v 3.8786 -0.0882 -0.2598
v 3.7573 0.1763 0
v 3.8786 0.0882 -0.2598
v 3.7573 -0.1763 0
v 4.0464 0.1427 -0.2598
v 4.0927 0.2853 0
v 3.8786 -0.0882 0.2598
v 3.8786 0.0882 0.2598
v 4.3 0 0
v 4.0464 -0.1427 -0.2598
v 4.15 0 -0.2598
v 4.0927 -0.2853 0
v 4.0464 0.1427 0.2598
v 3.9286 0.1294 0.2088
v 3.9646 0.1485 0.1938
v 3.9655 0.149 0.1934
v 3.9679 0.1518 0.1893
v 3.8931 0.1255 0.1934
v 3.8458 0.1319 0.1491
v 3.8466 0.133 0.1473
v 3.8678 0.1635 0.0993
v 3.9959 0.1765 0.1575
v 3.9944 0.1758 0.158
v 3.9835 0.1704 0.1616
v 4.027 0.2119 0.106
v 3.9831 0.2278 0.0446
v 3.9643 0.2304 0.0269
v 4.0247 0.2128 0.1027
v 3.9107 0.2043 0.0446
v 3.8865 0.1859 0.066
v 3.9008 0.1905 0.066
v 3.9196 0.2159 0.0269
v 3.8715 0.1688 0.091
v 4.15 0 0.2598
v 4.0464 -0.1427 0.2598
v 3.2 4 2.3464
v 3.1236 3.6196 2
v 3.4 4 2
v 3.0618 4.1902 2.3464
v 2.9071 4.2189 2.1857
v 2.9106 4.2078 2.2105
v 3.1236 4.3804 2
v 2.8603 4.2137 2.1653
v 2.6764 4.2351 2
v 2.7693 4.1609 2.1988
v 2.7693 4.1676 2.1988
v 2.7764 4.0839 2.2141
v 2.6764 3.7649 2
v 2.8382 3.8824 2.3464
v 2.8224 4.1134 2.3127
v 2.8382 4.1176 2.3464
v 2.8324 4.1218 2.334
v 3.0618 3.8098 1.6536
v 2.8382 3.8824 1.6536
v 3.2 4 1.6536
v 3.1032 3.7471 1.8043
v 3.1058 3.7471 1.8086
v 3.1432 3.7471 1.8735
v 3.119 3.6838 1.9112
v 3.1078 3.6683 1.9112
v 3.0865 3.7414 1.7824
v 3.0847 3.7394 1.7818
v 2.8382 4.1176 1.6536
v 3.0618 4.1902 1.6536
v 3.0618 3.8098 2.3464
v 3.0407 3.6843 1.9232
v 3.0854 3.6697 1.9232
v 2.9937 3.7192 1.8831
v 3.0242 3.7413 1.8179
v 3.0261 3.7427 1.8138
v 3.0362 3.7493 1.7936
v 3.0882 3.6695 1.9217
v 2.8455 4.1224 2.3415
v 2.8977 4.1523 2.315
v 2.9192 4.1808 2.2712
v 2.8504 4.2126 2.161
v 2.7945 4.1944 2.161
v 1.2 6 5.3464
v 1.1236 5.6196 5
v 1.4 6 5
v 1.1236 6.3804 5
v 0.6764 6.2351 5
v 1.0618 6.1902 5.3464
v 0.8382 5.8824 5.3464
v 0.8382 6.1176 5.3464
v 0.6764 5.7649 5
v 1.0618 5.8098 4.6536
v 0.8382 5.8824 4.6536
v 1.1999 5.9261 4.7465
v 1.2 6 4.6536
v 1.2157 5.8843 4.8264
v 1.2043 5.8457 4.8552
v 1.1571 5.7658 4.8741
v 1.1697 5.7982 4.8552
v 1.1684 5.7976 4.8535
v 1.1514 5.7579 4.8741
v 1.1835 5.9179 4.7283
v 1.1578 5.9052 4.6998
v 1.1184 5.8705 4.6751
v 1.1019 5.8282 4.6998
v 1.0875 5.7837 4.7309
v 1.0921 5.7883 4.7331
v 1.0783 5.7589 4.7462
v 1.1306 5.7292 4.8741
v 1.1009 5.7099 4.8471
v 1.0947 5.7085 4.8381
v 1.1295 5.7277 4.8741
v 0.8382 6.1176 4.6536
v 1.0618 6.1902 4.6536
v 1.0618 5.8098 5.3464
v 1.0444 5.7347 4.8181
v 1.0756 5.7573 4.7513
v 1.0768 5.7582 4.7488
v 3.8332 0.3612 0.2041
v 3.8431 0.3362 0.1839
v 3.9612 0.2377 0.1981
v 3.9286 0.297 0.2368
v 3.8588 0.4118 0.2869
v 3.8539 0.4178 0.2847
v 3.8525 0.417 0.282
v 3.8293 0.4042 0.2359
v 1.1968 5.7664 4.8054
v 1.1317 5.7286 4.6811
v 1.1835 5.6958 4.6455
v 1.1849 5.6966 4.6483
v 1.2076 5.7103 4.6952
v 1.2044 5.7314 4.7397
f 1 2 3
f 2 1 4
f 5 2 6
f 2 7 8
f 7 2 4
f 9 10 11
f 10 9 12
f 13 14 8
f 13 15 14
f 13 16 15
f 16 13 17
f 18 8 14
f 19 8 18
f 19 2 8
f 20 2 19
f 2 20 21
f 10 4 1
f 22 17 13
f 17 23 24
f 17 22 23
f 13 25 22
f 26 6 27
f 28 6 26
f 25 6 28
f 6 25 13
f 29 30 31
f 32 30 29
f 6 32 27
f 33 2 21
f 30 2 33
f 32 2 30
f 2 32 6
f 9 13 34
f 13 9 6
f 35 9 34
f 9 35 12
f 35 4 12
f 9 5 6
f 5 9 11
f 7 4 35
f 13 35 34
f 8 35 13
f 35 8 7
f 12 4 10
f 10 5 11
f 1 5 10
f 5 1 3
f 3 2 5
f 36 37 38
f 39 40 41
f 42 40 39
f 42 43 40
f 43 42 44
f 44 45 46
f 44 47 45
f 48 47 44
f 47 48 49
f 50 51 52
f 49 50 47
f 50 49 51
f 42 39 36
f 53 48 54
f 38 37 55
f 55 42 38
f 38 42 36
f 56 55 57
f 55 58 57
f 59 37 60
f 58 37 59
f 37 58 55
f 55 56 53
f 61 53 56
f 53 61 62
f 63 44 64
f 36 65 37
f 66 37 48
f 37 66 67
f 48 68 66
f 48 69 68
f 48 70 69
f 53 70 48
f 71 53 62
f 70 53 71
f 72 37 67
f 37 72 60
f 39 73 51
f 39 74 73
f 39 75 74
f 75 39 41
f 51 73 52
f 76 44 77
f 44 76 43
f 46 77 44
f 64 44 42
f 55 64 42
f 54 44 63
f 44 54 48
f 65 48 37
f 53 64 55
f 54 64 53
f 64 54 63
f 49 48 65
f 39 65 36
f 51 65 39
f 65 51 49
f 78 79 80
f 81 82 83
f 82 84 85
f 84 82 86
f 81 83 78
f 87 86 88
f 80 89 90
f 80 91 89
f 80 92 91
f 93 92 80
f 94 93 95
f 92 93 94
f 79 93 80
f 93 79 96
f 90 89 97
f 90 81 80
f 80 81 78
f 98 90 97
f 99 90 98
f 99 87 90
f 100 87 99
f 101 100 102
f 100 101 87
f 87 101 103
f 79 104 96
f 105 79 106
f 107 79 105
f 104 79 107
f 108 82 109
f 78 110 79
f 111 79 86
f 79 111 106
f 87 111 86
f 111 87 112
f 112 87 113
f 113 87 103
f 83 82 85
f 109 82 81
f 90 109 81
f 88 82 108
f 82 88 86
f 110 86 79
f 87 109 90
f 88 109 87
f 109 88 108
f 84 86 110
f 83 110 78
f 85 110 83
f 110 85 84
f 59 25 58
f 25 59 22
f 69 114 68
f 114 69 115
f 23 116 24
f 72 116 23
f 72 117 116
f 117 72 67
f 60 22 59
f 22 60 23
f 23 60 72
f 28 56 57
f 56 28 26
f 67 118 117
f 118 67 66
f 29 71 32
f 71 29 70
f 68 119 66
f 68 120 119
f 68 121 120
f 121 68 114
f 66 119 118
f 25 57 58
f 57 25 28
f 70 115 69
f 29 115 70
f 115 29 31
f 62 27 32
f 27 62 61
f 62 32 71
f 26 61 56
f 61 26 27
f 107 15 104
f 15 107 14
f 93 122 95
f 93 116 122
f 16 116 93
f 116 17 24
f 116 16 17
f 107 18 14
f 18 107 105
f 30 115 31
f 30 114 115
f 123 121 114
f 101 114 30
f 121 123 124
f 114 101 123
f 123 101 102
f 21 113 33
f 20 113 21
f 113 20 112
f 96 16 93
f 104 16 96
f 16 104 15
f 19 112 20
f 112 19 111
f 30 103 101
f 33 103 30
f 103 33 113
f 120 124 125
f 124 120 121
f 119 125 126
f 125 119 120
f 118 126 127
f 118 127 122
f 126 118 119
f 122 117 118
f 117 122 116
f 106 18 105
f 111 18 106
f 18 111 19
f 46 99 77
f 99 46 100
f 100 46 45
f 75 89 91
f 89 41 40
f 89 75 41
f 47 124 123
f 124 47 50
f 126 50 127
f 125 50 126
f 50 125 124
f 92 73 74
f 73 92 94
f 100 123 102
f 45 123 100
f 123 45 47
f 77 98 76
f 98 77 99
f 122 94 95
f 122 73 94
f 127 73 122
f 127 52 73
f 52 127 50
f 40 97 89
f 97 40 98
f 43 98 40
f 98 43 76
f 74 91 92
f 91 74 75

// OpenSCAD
// ============================================
//  NORMA vs DISTANCIA
// 
// ============================================

// ===== PARÁMETROS =====
origen = [4, 0, 0];   //  para mover el origen
punto1 = [3, 4, 2];
punto2 = [1, 6, 5];

// ===== MÓDULO PARA DIBUJAR LÍNEAS (VERSIÓN HULL) =====
module linea(p1, p2, r=0.05) {
    
    // "puente" entre dos esferas usando hull()
    hull() {
        translate(p1) sphere(r);
        translate(p2) sphere(r);
    }
}


// 1. El origen ( en rojo)
color("red") 
translate(origen) 
sphere(r=0.3);

// 2. Los dos puntos (azules)
color("blue") 
translate(punto1) 
sphere(r=0.4);

color("blue") 
translate(punto2) 
sphere(r=0.4);

// 3. Línea que representa la NORMA de punto1 (del ORIGEN a punto1)
color("green", 0.7) 
linea(origen, punto1, 0.08);

// 4. Línea que representa la NORMA de punto2 (del ORIGEN a punto2)
color("green", 0.7) 
linea(origen, punto2, 0.08);

// 5. Línea que representa la DISTANCIA (entre punto1 y punto2)
color("magenta", 0.9) 
linea(punto1, punto2, 0.1);

// ===== CÁLCULOS Y ETIQUETAS =====
norma1 = norm(punto1);
norma2 = norm(punto2);
distancia = norm(punto1 - punto2);

// Mostrar en consola
echo("Norma de punto1 (distancia al origen):", norma1);
echo("Norma de punto2 (distancia al origen):", norma2);
echo("Distancia entre punto1 y punto2:", distancia);
